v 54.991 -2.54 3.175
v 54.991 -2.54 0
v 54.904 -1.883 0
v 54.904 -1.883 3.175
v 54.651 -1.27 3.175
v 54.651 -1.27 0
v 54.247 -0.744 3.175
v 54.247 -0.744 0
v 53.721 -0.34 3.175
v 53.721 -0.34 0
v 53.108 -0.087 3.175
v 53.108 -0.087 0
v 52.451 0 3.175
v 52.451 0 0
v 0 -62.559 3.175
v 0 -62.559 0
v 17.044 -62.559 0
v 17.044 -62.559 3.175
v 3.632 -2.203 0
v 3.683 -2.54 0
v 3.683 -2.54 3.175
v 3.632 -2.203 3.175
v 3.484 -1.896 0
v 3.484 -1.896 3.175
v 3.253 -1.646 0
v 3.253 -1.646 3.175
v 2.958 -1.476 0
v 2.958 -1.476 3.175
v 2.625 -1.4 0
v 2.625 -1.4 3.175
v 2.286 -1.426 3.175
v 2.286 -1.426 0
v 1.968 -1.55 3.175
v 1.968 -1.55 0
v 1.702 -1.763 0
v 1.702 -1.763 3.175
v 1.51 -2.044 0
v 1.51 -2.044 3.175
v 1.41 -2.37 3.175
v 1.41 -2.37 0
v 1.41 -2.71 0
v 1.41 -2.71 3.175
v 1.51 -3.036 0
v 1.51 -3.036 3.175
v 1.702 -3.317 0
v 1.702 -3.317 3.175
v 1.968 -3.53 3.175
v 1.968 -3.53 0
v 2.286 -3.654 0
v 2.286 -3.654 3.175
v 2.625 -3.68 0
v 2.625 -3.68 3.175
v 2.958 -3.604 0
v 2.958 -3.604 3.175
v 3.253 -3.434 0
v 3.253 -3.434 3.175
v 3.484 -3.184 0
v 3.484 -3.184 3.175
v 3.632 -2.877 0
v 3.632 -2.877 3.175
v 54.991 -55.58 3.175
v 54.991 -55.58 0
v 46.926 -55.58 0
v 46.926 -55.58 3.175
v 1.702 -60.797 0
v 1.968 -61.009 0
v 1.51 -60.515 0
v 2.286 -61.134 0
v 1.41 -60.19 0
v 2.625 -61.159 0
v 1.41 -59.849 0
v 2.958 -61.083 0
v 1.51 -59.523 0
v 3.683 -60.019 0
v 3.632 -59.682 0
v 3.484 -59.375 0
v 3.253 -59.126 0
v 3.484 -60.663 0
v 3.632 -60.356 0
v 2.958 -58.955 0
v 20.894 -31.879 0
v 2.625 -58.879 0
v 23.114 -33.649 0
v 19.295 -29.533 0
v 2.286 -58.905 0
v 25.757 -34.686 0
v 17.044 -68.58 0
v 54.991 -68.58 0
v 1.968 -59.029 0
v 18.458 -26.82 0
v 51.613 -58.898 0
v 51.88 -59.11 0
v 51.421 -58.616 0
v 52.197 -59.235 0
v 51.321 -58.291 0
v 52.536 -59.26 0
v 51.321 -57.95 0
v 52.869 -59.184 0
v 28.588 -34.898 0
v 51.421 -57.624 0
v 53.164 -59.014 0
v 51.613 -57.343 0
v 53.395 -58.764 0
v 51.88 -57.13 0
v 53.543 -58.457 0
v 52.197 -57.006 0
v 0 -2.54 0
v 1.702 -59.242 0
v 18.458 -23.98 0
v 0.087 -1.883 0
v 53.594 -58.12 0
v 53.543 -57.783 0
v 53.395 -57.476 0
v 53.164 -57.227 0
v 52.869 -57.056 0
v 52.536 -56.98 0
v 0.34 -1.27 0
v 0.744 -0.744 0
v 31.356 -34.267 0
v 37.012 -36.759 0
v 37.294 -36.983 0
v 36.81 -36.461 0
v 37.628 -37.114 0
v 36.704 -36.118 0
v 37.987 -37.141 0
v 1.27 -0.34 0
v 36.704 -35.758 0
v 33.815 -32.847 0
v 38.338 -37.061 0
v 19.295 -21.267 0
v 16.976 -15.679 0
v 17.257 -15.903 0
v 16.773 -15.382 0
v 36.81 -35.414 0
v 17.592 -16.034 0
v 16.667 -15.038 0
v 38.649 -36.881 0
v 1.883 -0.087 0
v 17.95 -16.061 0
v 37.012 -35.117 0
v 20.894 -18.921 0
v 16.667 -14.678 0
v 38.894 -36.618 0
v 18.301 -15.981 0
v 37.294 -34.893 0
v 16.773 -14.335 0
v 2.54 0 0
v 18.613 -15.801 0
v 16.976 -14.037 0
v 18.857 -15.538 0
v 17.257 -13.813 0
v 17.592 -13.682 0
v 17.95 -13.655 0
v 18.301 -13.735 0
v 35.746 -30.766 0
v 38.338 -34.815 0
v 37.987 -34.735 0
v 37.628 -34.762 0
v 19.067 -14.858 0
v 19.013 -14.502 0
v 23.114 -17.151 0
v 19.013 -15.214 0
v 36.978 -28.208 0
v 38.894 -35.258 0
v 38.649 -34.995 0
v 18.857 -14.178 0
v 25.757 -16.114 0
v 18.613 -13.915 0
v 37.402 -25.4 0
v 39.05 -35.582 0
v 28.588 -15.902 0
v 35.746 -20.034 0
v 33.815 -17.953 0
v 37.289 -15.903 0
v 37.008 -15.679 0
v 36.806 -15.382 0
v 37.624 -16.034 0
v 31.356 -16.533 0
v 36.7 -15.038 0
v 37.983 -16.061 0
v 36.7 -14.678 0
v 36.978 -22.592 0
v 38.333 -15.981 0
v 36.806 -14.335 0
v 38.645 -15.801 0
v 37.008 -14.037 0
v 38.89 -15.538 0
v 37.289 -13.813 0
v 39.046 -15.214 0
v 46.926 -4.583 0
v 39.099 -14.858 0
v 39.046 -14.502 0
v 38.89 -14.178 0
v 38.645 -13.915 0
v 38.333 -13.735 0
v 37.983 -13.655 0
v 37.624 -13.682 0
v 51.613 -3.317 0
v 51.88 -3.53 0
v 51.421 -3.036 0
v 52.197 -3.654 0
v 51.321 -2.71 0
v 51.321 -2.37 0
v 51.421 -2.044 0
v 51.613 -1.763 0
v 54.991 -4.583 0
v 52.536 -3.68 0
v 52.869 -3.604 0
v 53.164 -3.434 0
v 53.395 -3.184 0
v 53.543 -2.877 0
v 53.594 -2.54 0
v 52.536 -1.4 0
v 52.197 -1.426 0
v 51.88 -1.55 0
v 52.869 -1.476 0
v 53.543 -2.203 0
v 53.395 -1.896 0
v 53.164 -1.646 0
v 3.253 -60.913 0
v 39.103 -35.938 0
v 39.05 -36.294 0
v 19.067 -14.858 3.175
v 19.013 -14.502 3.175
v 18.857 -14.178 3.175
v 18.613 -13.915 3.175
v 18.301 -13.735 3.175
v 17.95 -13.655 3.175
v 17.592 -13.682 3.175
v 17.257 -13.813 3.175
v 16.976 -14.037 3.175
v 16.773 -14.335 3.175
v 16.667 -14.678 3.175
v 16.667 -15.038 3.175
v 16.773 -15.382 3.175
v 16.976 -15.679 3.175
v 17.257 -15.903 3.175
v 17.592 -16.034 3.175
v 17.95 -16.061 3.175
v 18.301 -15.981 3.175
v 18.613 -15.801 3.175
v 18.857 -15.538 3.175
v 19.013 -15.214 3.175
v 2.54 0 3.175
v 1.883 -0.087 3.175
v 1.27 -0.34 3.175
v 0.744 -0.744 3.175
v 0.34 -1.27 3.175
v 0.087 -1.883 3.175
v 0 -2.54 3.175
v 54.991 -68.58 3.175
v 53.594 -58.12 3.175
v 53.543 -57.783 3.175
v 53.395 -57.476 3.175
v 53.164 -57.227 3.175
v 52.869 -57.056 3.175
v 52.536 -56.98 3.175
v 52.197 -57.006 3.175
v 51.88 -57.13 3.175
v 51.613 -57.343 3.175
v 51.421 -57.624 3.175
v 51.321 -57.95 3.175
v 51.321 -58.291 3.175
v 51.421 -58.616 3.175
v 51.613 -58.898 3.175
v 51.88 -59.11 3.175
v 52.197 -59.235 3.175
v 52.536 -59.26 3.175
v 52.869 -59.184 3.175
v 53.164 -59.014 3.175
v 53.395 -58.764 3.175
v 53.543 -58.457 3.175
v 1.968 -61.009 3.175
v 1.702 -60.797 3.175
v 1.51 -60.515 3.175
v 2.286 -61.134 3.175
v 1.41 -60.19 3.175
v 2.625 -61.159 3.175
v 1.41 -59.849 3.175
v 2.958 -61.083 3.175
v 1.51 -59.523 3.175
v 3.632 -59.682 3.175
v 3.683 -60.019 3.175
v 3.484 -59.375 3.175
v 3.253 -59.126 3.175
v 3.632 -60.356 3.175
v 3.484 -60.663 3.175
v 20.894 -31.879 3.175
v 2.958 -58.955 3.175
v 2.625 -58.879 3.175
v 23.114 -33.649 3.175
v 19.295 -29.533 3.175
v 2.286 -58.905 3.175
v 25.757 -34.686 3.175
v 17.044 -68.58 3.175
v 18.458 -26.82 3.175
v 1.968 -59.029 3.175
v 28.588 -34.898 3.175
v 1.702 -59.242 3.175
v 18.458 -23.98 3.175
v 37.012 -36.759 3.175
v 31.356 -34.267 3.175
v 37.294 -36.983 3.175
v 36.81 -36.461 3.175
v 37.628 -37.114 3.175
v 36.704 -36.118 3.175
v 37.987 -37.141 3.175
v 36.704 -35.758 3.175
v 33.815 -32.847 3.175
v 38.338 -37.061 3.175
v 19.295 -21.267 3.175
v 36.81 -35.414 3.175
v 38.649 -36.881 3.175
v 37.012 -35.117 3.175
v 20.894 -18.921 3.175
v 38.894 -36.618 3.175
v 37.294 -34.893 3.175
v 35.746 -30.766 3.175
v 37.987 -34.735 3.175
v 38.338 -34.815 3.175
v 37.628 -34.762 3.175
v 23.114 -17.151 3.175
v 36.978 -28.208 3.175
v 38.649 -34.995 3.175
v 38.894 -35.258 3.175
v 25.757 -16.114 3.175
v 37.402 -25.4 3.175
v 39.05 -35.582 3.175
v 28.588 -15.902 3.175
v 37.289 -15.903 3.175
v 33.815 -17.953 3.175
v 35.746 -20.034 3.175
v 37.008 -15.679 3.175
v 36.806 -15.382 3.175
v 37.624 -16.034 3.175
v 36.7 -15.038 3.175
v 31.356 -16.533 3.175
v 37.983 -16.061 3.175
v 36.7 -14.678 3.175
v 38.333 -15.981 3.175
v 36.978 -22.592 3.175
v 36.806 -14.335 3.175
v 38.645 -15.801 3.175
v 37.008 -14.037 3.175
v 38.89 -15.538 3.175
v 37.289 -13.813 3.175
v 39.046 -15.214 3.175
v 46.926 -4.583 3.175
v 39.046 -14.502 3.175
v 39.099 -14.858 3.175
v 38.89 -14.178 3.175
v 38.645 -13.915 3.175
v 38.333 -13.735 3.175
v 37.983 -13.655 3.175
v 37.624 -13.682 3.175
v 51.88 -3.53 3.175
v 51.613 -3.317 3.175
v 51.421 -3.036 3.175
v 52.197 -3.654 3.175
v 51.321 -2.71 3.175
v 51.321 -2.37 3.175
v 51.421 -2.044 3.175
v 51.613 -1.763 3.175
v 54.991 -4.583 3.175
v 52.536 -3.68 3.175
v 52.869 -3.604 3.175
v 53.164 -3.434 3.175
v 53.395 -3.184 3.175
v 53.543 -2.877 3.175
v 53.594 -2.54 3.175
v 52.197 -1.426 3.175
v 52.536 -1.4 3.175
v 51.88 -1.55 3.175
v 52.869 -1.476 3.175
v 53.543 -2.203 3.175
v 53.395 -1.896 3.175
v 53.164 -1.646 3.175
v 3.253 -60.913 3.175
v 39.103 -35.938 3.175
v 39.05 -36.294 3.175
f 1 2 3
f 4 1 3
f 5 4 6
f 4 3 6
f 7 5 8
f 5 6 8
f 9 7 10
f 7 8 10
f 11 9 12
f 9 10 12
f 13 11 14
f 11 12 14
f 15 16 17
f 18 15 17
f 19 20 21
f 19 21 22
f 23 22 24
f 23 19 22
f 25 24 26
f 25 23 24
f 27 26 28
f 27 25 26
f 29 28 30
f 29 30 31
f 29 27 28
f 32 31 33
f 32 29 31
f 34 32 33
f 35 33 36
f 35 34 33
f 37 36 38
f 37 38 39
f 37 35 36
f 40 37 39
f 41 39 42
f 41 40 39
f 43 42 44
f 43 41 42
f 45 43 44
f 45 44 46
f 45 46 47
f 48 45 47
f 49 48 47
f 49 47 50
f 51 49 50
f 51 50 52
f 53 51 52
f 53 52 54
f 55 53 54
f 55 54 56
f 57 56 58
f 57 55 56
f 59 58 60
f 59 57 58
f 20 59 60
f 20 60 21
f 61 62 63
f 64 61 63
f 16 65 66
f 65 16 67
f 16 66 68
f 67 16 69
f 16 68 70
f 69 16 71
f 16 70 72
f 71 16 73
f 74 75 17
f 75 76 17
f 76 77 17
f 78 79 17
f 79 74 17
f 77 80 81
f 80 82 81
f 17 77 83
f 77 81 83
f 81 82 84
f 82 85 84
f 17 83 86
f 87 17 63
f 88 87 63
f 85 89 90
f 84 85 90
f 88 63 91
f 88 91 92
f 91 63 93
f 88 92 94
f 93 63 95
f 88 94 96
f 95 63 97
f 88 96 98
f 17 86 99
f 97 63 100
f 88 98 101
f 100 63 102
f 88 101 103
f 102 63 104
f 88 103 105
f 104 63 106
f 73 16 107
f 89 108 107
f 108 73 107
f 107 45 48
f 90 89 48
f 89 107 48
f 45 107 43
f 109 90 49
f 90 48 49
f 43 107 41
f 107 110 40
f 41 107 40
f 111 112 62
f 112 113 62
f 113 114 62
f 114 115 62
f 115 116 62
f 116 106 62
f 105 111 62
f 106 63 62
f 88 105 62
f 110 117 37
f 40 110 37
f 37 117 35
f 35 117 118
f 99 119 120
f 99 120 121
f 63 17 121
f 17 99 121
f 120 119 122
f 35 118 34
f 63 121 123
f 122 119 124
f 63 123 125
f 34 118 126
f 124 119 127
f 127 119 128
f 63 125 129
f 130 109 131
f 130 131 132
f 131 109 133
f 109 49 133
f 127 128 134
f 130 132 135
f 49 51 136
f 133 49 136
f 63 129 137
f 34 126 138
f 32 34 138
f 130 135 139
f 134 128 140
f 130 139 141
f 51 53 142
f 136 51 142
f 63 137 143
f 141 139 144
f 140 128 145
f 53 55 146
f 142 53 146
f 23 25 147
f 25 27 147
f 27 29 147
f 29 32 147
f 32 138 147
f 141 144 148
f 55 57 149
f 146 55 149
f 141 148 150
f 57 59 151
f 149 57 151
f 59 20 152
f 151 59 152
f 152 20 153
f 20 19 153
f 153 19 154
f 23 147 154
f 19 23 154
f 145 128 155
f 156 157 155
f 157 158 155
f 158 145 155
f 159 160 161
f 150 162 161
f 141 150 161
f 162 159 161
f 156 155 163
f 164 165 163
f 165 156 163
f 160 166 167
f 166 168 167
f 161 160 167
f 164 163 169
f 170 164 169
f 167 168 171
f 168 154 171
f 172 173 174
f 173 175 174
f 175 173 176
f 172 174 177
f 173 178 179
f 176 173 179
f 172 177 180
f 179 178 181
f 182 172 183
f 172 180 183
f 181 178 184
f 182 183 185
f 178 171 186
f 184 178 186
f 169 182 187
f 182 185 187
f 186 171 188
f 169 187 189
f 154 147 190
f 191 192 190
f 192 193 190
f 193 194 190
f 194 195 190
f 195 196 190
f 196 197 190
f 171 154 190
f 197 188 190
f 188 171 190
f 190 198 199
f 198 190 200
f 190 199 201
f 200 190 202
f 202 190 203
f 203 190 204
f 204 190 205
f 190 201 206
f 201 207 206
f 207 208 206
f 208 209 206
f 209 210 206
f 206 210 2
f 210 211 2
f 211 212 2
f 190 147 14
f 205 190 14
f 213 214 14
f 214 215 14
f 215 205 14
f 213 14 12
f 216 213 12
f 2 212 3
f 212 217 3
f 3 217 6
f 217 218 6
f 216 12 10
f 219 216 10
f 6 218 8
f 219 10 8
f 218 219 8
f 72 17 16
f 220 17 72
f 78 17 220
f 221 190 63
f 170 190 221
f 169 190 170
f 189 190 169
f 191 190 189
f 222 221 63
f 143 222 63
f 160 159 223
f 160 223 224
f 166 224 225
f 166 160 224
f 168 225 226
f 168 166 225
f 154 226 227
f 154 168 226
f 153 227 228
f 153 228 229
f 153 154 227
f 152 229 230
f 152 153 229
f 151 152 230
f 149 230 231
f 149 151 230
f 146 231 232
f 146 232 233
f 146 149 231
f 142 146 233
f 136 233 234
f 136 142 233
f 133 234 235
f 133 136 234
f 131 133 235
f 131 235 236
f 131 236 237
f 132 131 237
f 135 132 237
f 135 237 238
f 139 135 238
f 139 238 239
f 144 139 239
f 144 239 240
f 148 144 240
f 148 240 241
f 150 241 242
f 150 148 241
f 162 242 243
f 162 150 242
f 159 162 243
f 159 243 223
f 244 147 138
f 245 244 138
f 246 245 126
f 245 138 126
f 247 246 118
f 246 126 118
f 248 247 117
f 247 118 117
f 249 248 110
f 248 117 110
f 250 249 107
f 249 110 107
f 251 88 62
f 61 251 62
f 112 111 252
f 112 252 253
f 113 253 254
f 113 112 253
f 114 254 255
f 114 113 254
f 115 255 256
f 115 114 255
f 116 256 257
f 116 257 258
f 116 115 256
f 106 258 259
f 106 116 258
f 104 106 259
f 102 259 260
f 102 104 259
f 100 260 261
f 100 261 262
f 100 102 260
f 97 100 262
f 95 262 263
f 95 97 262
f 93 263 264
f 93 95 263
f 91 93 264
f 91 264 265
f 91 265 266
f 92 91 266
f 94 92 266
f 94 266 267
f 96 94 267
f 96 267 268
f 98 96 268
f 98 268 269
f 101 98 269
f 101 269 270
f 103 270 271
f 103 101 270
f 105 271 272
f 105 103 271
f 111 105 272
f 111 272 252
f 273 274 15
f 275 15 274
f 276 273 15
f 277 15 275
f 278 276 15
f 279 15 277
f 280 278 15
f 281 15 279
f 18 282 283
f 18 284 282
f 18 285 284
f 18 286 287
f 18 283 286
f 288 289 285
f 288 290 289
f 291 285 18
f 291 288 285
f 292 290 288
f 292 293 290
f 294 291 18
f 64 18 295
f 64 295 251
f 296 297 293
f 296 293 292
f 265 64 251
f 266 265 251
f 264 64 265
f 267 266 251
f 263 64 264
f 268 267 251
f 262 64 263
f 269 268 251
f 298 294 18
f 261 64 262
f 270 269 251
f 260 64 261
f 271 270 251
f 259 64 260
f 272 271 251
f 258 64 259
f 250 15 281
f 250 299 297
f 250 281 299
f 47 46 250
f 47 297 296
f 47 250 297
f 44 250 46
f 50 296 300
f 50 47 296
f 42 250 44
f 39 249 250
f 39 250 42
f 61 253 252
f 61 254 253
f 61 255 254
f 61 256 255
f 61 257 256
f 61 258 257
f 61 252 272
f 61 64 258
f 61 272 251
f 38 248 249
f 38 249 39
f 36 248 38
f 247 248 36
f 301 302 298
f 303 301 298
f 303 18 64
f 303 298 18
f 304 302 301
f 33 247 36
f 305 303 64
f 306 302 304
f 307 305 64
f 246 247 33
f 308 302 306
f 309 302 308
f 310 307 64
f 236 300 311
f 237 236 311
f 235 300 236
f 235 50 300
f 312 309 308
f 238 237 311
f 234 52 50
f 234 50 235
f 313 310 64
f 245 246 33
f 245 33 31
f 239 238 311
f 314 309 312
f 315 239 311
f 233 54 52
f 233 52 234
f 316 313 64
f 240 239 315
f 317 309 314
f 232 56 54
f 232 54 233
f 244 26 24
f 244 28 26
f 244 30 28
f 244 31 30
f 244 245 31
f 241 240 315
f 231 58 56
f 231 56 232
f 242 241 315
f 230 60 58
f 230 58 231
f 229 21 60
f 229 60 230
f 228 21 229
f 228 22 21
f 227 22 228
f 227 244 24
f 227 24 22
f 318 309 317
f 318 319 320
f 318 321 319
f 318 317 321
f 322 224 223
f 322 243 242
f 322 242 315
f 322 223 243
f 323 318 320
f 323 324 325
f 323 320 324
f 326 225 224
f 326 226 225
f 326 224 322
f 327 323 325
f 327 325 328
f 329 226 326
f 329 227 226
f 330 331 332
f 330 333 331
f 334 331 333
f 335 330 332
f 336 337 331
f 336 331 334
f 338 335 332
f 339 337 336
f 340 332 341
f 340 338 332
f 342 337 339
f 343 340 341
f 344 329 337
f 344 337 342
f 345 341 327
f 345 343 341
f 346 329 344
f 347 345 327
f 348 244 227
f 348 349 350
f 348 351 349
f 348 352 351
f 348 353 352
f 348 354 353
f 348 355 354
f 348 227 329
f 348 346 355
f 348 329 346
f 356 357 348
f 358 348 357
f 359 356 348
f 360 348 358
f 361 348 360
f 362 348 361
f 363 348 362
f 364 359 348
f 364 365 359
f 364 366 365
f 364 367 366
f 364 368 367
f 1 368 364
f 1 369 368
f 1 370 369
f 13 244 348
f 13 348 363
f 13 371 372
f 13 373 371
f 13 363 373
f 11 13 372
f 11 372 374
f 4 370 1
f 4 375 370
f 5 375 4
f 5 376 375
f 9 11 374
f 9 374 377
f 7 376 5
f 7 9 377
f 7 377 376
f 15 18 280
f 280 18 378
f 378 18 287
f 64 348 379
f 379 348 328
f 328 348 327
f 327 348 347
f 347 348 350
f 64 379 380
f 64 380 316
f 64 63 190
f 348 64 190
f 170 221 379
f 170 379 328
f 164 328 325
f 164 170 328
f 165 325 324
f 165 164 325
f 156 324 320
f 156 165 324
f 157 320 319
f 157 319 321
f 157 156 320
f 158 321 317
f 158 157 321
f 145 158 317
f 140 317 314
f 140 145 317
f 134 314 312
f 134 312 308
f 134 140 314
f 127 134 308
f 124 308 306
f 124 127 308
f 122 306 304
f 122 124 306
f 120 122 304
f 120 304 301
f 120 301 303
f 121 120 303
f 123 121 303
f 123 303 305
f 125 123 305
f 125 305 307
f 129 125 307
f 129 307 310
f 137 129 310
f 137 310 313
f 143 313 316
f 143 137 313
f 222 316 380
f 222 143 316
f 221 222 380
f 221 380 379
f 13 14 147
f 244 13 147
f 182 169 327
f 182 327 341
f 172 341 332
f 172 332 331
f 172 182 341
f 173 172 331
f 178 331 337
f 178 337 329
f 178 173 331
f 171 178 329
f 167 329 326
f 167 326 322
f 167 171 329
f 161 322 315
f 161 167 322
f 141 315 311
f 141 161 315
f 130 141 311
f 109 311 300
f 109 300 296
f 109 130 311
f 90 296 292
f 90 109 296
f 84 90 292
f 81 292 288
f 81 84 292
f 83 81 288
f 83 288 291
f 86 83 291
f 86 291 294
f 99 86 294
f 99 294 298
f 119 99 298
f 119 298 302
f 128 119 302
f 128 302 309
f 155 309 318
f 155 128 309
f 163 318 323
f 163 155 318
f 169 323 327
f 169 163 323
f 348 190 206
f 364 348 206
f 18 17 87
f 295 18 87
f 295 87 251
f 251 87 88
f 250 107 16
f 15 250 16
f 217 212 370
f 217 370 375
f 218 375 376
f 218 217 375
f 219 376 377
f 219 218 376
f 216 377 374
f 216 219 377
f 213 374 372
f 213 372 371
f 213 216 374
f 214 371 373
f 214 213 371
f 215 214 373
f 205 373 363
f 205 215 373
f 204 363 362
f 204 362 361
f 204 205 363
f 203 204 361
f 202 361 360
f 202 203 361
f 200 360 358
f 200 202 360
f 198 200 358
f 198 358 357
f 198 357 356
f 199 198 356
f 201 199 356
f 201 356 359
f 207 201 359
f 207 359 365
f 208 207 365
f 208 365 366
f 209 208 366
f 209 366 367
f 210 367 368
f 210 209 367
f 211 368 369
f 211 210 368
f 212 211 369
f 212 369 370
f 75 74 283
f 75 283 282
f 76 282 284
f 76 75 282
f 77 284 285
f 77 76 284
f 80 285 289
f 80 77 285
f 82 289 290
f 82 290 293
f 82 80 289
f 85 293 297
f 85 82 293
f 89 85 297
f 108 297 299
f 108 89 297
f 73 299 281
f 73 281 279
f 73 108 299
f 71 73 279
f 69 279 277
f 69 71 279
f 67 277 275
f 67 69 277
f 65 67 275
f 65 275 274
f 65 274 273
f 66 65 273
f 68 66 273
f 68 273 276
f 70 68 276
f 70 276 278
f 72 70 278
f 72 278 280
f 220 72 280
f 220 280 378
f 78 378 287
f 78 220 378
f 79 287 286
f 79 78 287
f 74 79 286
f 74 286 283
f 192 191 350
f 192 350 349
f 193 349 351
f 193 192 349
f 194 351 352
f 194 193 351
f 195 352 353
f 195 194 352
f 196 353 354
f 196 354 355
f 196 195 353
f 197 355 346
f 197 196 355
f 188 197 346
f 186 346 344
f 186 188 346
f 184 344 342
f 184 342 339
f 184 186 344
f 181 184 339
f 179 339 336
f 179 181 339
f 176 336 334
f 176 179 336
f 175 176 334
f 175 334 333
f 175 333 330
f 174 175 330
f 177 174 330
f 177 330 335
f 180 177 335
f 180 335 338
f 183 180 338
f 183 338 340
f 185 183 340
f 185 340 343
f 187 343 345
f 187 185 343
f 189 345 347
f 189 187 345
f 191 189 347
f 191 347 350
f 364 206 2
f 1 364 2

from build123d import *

# Parameters (mm, degrees)
F0_R     = 1.143
F0_R_2   = 1.2065
F0_R_3   = 9.525
F1_DEPTH = 3.175


with BuildPart() as f1:
    # F0 (on Top) → F1 (new body)
    with BuildSketch(Plane.XY):
        with BuildLine():
            Line((52.451, 0), (2.54, 0))
            ThreePointArc((2.54, 0), (0.743949, -0.743949), (0, -2.54))
            Line((0, -2.54), (0, -62.559217))
            Line((0, -62.559217), (17.044382, -62.559217))
            Line((17.044382, -62.559217), (17.044382, -68.58))
            Line((17.044382, -68.58), (54.991, -68.58))
            Line((54.991, -68.58), (54.991, -55.58028))
            Line((54.991, -55.58028), (46.9265, -55.58028))
            Line((46.9265, -55.58028), (46.9265, -4.582543))
            Line((46.9265, -4.582543), (54.991, -4.582543))
            Line((54.991, -4.582543), (54.991, -2.54))
            ThreePointArc((54.991, -2.54), (54.247051, -0.743949), (52.451, 0))
        make_face()
        with Locations((2.54, -60.019217)):
            Circle(F0_R, mode=Mode.SUBTRACT)
        with Locations((52.451, -58.12028)):
            Circle(F0_R, mode=Mode.SUBTRACT)
        with Locations((37.8968, -35.93797)):
            Circle(F0_R_2, mode=Mode.SUBTRACT)
        with Locations((2.54, -2.54)):
            Circle(F0_R, mode=Mode.SUBTRACT)
        with Locations((17.860312, -14.858122)):
            Circle(F0_R_2, mode=Mode.SUBTRACT)
        with Locations((27.8765, -25.4)):
            Circle(F0_R_3, mode=Mode.SUBTRACT)
        with Locations((37.892688, -14.858122)):
            Circle(F0_R_2, mode=Mode.SUBTRACT)
        with Locations((52.451, -2.54)):
            Circle(F0_R, mode=Mode.SUBTRACT)
    extrude(amount=F1_DEPTH)


solid = f1.part
